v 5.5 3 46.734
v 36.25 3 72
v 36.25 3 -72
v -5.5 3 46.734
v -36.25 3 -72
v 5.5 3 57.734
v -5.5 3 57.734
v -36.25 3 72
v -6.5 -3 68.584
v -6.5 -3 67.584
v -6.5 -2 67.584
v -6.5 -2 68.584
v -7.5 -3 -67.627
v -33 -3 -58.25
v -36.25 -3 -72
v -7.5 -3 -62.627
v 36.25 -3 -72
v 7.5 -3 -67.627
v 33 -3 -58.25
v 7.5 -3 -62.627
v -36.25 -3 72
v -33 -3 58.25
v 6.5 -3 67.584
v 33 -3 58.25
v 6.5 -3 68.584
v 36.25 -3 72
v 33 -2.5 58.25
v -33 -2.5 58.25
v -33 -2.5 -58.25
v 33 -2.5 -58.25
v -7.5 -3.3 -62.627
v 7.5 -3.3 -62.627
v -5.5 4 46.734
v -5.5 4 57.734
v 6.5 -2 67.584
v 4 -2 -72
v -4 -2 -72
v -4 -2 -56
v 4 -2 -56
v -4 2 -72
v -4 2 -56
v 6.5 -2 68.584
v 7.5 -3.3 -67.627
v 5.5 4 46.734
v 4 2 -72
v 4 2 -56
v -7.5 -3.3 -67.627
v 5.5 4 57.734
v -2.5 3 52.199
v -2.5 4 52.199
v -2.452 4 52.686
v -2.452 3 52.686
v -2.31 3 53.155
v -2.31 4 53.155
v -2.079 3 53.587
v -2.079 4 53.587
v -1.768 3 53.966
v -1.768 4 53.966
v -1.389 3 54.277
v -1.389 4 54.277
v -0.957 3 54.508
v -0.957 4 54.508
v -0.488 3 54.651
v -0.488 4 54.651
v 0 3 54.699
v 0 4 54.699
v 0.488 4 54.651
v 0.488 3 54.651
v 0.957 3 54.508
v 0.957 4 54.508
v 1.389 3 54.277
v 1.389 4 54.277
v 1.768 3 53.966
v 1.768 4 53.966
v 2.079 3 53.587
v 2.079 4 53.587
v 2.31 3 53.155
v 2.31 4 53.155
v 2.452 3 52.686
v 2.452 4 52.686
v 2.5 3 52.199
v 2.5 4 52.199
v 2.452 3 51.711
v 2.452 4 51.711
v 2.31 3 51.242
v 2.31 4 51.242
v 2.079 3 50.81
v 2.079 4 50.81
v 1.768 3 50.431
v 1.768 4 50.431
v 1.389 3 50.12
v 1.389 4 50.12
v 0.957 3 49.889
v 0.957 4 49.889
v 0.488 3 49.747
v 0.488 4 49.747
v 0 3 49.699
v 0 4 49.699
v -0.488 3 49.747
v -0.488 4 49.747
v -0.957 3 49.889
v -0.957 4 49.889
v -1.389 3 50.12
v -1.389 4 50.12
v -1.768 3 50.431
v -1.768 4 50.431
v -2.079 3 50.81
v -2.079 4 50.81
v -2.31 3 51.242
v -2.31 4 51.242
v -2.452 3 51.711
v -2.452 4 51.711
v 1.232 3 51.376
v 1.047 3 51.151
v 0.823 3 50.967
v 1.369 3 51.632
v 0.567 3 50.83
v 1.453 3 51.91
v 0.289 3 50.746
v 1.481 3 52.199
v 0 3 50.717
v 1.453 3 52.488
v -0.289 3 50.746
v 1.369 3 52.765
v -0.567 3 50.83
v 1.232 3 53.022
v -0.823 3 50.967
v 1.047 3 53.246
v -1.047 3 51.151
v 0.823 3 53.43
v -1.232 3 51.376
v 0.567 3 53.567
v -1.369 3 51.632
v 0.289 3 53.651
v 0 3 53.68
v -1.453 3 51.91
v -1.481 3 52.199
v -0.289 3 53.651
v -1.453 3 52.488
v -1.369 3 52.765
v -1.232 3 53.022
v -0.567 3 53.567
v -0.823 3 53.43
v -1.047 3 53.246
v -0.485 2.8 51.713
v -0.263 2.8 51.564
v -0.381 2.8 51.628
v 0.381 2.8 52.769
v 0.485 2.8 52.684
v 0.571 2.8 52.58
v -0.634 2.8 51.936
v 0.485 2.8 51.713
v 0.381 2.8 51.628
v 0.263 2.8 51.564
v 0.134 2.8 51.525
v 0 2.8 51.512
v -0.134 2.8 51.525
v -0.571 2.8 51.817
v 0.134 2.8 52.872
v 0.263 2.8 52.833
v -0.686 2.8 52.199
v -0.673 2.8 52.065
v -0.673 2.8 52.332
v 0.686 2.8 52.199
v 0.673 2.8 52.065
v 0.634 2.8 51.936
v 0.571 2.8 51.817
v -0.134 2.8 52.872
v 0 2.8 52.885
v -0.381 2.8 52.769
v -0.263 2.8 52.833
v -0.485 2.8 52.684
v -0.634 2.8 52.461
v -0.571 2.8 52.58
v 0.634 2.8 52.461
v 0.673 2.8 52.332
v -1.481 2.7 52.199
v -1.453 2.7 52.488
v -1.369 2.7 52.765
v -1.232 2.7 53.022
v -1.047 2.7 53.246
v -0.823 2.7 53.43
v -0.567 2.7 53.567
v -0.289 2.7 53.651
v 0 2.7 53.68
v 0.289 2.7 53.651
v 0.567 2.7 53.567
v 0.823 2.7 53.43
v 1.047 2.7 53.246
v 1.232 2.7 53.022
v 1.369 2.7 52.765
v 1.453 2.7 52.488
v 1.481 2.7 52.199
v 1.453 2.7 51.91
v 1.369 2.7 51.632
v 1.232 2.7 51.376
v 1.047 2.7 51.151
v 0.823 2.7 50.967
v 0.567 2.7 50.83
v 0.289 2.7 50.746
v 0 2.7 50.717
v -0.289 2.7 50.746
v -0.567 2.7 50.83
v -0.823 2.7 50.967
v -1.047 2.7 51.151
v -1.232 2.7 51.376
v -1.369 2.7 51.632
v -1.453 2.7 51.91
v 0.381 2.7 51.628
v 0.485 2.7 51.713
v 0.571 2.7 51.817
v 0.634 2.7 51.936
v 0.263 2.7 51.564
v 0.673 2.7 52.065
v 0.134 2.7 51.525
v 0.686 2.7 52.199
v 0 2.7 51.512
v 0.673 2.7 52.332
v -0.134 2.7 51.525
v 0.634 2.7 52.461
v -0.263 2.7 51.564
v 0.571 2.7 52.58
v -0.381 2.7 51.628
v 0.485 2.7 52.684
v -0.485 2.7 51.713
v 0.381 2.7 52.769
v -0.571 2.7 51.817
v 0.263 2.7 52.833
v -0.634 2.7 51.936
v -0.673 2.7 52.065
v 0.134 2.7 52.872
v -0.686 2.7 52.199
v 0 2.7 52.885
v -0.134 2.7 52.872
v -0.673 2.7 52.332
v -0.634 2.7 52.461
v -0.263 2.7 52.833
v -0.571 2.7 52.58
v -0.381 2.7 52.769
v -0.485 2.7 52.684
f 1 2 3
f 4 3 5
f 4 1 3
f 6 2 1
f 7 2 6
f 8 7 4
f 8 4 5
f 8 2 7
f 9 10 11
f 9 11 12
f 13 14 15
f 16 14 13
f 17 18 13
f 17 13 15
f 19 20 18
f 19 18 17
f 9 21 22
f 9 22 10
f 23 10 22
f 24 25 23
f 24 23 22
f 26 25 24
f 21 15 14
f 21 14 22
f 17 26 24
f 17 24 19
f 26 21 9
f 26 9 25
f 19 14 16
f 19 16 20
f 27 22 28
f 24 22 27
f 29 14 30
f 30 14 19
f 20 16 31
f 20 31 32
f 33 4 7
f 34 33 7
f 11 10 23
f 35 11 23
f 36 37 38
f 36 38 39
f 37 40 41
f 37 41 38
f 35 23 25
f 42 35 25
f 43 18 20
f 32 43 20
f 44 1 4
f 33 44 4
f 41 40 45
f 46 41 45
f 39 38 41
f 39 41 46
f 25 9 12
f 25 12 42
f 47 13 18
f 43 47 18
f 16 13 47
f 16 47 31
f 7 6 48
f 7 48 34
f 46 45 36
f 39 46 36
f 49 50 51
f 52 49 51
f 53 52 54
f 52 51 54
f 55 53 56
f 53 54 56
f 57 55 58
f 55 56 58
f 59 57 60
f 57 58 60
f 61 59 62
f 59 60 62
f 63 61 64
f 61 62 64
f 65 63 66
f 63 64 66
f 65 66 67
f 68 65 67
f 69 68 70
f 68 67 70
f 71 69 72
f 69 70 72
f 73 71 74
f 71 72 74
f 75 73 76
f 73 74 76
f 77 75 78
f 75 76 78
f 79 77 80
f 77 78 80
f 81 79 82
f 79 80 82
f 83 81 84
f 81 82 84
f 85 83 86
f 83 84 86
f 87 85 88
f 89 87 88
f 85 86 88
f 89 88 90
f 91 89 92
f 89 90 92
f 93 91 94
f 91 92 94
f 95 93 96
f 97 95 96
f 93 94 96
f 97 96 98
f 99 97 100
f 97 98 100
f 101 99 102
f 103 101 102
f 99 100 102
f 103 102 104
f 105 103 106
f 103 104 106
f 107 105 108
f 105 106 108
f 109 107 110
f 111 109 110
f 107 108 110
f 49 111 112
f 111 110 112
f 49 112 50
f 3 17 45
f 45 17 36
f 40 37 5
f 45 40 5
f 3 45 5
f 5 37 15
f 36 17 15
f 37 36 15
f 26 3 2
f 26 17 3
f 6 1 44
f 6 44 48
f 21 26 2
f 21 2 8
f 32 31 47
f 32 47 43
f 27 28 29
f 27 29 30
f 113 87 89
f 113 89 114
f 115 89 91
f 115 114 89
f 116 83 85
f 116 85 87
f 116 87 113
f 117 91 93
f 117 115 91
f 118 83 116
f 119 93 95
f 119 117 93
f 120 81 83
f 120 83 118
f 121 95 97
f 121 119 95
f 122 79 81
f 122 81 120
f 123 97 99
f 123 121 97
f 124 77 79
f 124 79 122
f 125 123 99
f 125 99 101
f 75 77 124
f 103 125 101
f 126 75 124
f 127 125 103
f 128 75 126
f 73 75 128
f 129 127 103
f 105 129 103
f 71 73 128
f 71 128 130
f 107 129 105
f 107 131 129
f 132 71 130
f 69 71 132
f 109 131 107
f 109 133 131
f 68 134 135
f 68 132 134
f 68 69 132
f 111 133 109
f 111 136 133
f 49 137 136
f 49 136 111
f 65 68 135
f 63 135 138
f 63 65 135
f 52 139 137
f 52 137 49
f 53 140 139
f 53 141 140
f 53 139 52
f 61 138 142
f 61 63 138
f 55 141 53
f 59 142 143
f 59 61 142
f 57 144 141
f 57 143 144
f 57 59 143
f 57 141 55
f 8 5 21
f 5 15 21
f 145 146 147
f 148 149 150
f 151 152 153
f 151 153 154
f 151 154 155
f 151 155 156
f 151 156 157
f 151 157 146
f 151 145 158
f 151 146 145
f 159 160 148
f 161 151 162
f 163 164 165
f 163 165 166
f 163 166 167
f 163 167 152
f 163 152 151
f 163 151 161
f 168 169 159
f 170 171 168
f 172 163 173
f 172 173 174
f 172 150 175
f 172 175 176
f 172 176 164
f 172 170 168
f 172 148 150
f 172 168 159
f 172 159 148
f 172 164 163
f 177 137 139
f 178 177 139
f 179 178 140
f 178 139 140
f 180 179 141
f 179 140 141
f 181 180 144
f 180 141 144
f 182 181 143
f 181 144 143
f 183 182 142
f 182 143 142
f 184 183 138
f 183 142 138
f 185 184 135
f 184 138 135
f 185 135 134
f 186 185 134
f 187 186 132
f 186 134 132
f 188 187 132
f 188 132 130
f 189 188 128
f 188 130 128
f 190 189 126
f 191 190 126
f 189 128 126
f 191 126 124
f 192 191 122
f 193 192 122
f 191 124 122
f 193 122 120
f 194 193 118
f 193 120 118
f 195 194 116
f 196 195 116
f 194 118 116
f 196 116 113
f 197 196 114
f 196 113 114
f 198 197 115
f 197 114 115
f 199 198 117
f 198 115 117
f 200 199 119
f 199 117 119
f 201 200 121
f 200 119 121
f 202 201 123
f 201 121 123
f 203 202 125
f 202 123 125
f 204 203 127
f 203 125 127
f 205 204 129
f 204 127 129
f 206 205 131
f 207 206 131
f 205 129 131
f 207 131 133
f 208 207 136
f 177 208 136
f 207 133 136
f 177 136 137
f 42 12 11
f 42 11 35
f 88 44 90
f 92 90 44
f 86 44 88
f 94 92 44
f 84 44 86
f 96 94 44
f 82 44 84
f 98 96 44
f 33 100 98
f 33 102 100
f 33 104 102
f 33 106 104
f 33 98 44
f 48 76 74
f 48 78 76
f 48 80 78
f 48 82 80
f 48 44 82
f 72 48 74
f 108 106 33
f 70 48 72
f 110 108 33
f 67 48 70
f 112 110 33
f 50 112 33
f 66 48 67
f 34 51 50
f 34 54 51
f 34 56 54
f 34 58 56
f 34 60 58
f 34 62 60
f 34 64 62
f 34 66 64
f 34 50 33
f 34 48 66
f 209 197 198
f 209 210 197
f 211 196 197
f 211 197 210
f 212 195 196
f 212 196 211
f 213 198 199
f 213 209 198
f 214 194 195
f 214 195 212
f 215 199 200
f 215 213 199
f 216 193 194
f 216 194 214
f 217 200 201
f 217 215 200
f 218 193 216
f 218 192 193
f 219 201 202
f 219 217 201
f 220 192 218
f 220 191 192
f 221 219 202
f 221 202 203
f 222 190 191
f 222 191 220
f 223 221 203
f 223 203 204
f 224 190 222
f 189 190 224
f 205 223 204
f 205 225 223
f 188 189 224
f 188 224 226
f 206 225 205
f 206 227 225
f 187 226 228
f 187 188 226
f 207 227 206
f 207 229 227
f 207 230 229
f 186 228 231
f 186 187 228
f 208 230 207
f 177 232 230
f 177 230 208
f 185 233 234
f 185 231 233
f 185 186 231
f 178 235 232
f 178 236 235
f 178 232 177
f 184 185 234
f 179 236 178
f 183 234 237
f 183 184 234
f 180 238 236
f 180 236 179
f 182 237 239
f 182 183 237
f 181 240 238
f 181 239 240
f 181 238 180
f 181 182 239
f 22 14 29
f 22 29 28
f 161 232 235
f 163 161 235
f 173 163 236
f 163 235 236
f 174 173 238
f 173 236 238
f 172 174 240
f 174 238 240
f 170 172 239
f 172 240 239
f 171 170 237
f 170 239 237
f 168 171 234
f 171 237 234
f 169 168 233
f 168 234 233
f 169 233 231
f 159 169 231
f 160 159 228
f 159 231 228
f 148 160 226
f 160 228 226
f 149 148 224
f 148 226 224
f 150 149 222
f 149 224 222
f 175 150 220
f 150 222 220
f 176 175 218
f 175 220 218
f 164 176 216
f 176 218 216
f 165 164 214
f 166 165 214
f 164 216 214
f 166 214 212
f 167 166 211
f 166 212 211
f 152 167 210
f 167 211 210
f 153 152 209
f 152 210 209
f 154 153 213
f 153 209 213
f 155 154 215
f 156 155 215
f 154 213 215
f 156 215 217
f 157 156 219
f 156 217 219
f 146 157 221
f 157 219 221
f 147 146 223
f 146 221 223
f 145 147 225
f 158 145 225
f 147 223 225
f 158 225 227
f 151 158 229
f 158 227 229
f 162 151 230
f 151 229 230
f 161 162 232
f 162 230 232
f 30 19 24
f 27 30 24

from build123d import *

# Parameters (mm, degrees)
F0_W      = 72.5
F0_H      = 144
F1_DEPTH  = 3
F2_W      = 72.5
F2_H      = 144
F3_DEPTH  = 3
F5_W      = 15
F5_H      = 5
F6_DEPTH  = 0.3
F7_W      = 8
F7_H      = 4
F8_DEPTH  = 16
F9_W      = 13
F9_H      = 1
F10_DEPTH = 1
F11_W     = 11
F11_H     = 11
F12_DEPTH = 1
F13_R     = 2.5
F14_DEPTH = 1
F4_W      = 66
F4_H      = 116.5
F15_DEPTH = 0.5
F16_R     = 1.481304
F17_DEPTH = 0.3
F18_R     = 0.686306
F19_DEPTH = 0.1


with BuildPart() as f1:
    # F0 (on Front) → F1 (new body)
    with BuildSketch(Plane.XZ):
        Rectangle(F0_W, F0_H)
    extrude(amount=F1_DEPTH)

    # F2 (on face) → F3 (join)
    with BuildSketch(Plane(origin=(0, 0, 0), x_dir=(-1, 0, 0), z_dir=(0, 1, 0))):
        Rectangle(F2_W, F2_H)
    extrude(amount=F3_DEPTH)

    # F5 (on face) → F6 (join)
    with BuildSketch(Plane.XZ.offset(3)):
        with Locations((0, -65.126628)):
            Rectangle(F5_W, F5_H)
    extrude(amount=F6_DEPTH)

    # F7 (on face) → F8 (cut)
    with BuildSketch(Plane(origin=(0, 0, -72), x_dir=(1, 0, 0), z_dir=(0, 0, -1))):
        Rectangle(F7_W, F7_H)
    extrude(amount=-F8_DEPTH, mode=Mode.SUBTRACT)

    # F9 (on face) → F10 (cut)
    with BuildSketch(Plane.XZ.offset(3)):
        with Locations((0, 68.084061)):
            Rectangle(F9_W, F9_H)
    extrude(amount=-F10_DEPTH, mode=Mode.SUBTRACT)

    # F11 (on face) → F12 (join)
    with BuildSketch(Plane(origin=(0, 3, 0), x_dir=(-1, 0, 0), z_dir=(0, 1, 0))):
        with Locations((0, 52.234016)):
            Rectangle(F11_W, F11_H)
    extrude(amount=F12_DEPTH)

    # F13 (on face) → F14 (cut)
    with BuildSketch(Plane(origin=(0, 4, 0), x_dir=(-1, 0, 0), z_dir=(0, 1, 0))):
        with Locations((0, 52.198544)):
            Circle(F13_R)
    extrude(amount=-F14_DEPTH, mode=Mode.SUBTRACT)

    # F4 (on face) → F15 (cut)
    with BuildSketch(Plane.XZ.offset(3)):
        Rectangle(F4_W, F4_H)
    extrude(amount=-F15_DEPTH, mode=Mode.SUBTRACT)

    # F16 (on face) → F17 (cut)
    with BuildSketch(Plane(origin=(0, 3, 0), x_dir=(-1, 0, 0), z_dir=(0, 1, 0))):
        with Locations((0, 52.198544)):
            Circle(F16_R)
    extrude(amount=-F17_DEPTH, mode=Mode.SUBTRACT)

    # F18 (on face) → F19 (join)
    with BuildSketch(Plane(origin=(0, 2.7, 0), x_dir=(-1, 0, 0), z_dir=(0, 1, 0))):
        with Locations((0, 52.198544)):
            Circle(F18_R)
    extrude(amount=F19_DEPTH)


solid = f1.part
